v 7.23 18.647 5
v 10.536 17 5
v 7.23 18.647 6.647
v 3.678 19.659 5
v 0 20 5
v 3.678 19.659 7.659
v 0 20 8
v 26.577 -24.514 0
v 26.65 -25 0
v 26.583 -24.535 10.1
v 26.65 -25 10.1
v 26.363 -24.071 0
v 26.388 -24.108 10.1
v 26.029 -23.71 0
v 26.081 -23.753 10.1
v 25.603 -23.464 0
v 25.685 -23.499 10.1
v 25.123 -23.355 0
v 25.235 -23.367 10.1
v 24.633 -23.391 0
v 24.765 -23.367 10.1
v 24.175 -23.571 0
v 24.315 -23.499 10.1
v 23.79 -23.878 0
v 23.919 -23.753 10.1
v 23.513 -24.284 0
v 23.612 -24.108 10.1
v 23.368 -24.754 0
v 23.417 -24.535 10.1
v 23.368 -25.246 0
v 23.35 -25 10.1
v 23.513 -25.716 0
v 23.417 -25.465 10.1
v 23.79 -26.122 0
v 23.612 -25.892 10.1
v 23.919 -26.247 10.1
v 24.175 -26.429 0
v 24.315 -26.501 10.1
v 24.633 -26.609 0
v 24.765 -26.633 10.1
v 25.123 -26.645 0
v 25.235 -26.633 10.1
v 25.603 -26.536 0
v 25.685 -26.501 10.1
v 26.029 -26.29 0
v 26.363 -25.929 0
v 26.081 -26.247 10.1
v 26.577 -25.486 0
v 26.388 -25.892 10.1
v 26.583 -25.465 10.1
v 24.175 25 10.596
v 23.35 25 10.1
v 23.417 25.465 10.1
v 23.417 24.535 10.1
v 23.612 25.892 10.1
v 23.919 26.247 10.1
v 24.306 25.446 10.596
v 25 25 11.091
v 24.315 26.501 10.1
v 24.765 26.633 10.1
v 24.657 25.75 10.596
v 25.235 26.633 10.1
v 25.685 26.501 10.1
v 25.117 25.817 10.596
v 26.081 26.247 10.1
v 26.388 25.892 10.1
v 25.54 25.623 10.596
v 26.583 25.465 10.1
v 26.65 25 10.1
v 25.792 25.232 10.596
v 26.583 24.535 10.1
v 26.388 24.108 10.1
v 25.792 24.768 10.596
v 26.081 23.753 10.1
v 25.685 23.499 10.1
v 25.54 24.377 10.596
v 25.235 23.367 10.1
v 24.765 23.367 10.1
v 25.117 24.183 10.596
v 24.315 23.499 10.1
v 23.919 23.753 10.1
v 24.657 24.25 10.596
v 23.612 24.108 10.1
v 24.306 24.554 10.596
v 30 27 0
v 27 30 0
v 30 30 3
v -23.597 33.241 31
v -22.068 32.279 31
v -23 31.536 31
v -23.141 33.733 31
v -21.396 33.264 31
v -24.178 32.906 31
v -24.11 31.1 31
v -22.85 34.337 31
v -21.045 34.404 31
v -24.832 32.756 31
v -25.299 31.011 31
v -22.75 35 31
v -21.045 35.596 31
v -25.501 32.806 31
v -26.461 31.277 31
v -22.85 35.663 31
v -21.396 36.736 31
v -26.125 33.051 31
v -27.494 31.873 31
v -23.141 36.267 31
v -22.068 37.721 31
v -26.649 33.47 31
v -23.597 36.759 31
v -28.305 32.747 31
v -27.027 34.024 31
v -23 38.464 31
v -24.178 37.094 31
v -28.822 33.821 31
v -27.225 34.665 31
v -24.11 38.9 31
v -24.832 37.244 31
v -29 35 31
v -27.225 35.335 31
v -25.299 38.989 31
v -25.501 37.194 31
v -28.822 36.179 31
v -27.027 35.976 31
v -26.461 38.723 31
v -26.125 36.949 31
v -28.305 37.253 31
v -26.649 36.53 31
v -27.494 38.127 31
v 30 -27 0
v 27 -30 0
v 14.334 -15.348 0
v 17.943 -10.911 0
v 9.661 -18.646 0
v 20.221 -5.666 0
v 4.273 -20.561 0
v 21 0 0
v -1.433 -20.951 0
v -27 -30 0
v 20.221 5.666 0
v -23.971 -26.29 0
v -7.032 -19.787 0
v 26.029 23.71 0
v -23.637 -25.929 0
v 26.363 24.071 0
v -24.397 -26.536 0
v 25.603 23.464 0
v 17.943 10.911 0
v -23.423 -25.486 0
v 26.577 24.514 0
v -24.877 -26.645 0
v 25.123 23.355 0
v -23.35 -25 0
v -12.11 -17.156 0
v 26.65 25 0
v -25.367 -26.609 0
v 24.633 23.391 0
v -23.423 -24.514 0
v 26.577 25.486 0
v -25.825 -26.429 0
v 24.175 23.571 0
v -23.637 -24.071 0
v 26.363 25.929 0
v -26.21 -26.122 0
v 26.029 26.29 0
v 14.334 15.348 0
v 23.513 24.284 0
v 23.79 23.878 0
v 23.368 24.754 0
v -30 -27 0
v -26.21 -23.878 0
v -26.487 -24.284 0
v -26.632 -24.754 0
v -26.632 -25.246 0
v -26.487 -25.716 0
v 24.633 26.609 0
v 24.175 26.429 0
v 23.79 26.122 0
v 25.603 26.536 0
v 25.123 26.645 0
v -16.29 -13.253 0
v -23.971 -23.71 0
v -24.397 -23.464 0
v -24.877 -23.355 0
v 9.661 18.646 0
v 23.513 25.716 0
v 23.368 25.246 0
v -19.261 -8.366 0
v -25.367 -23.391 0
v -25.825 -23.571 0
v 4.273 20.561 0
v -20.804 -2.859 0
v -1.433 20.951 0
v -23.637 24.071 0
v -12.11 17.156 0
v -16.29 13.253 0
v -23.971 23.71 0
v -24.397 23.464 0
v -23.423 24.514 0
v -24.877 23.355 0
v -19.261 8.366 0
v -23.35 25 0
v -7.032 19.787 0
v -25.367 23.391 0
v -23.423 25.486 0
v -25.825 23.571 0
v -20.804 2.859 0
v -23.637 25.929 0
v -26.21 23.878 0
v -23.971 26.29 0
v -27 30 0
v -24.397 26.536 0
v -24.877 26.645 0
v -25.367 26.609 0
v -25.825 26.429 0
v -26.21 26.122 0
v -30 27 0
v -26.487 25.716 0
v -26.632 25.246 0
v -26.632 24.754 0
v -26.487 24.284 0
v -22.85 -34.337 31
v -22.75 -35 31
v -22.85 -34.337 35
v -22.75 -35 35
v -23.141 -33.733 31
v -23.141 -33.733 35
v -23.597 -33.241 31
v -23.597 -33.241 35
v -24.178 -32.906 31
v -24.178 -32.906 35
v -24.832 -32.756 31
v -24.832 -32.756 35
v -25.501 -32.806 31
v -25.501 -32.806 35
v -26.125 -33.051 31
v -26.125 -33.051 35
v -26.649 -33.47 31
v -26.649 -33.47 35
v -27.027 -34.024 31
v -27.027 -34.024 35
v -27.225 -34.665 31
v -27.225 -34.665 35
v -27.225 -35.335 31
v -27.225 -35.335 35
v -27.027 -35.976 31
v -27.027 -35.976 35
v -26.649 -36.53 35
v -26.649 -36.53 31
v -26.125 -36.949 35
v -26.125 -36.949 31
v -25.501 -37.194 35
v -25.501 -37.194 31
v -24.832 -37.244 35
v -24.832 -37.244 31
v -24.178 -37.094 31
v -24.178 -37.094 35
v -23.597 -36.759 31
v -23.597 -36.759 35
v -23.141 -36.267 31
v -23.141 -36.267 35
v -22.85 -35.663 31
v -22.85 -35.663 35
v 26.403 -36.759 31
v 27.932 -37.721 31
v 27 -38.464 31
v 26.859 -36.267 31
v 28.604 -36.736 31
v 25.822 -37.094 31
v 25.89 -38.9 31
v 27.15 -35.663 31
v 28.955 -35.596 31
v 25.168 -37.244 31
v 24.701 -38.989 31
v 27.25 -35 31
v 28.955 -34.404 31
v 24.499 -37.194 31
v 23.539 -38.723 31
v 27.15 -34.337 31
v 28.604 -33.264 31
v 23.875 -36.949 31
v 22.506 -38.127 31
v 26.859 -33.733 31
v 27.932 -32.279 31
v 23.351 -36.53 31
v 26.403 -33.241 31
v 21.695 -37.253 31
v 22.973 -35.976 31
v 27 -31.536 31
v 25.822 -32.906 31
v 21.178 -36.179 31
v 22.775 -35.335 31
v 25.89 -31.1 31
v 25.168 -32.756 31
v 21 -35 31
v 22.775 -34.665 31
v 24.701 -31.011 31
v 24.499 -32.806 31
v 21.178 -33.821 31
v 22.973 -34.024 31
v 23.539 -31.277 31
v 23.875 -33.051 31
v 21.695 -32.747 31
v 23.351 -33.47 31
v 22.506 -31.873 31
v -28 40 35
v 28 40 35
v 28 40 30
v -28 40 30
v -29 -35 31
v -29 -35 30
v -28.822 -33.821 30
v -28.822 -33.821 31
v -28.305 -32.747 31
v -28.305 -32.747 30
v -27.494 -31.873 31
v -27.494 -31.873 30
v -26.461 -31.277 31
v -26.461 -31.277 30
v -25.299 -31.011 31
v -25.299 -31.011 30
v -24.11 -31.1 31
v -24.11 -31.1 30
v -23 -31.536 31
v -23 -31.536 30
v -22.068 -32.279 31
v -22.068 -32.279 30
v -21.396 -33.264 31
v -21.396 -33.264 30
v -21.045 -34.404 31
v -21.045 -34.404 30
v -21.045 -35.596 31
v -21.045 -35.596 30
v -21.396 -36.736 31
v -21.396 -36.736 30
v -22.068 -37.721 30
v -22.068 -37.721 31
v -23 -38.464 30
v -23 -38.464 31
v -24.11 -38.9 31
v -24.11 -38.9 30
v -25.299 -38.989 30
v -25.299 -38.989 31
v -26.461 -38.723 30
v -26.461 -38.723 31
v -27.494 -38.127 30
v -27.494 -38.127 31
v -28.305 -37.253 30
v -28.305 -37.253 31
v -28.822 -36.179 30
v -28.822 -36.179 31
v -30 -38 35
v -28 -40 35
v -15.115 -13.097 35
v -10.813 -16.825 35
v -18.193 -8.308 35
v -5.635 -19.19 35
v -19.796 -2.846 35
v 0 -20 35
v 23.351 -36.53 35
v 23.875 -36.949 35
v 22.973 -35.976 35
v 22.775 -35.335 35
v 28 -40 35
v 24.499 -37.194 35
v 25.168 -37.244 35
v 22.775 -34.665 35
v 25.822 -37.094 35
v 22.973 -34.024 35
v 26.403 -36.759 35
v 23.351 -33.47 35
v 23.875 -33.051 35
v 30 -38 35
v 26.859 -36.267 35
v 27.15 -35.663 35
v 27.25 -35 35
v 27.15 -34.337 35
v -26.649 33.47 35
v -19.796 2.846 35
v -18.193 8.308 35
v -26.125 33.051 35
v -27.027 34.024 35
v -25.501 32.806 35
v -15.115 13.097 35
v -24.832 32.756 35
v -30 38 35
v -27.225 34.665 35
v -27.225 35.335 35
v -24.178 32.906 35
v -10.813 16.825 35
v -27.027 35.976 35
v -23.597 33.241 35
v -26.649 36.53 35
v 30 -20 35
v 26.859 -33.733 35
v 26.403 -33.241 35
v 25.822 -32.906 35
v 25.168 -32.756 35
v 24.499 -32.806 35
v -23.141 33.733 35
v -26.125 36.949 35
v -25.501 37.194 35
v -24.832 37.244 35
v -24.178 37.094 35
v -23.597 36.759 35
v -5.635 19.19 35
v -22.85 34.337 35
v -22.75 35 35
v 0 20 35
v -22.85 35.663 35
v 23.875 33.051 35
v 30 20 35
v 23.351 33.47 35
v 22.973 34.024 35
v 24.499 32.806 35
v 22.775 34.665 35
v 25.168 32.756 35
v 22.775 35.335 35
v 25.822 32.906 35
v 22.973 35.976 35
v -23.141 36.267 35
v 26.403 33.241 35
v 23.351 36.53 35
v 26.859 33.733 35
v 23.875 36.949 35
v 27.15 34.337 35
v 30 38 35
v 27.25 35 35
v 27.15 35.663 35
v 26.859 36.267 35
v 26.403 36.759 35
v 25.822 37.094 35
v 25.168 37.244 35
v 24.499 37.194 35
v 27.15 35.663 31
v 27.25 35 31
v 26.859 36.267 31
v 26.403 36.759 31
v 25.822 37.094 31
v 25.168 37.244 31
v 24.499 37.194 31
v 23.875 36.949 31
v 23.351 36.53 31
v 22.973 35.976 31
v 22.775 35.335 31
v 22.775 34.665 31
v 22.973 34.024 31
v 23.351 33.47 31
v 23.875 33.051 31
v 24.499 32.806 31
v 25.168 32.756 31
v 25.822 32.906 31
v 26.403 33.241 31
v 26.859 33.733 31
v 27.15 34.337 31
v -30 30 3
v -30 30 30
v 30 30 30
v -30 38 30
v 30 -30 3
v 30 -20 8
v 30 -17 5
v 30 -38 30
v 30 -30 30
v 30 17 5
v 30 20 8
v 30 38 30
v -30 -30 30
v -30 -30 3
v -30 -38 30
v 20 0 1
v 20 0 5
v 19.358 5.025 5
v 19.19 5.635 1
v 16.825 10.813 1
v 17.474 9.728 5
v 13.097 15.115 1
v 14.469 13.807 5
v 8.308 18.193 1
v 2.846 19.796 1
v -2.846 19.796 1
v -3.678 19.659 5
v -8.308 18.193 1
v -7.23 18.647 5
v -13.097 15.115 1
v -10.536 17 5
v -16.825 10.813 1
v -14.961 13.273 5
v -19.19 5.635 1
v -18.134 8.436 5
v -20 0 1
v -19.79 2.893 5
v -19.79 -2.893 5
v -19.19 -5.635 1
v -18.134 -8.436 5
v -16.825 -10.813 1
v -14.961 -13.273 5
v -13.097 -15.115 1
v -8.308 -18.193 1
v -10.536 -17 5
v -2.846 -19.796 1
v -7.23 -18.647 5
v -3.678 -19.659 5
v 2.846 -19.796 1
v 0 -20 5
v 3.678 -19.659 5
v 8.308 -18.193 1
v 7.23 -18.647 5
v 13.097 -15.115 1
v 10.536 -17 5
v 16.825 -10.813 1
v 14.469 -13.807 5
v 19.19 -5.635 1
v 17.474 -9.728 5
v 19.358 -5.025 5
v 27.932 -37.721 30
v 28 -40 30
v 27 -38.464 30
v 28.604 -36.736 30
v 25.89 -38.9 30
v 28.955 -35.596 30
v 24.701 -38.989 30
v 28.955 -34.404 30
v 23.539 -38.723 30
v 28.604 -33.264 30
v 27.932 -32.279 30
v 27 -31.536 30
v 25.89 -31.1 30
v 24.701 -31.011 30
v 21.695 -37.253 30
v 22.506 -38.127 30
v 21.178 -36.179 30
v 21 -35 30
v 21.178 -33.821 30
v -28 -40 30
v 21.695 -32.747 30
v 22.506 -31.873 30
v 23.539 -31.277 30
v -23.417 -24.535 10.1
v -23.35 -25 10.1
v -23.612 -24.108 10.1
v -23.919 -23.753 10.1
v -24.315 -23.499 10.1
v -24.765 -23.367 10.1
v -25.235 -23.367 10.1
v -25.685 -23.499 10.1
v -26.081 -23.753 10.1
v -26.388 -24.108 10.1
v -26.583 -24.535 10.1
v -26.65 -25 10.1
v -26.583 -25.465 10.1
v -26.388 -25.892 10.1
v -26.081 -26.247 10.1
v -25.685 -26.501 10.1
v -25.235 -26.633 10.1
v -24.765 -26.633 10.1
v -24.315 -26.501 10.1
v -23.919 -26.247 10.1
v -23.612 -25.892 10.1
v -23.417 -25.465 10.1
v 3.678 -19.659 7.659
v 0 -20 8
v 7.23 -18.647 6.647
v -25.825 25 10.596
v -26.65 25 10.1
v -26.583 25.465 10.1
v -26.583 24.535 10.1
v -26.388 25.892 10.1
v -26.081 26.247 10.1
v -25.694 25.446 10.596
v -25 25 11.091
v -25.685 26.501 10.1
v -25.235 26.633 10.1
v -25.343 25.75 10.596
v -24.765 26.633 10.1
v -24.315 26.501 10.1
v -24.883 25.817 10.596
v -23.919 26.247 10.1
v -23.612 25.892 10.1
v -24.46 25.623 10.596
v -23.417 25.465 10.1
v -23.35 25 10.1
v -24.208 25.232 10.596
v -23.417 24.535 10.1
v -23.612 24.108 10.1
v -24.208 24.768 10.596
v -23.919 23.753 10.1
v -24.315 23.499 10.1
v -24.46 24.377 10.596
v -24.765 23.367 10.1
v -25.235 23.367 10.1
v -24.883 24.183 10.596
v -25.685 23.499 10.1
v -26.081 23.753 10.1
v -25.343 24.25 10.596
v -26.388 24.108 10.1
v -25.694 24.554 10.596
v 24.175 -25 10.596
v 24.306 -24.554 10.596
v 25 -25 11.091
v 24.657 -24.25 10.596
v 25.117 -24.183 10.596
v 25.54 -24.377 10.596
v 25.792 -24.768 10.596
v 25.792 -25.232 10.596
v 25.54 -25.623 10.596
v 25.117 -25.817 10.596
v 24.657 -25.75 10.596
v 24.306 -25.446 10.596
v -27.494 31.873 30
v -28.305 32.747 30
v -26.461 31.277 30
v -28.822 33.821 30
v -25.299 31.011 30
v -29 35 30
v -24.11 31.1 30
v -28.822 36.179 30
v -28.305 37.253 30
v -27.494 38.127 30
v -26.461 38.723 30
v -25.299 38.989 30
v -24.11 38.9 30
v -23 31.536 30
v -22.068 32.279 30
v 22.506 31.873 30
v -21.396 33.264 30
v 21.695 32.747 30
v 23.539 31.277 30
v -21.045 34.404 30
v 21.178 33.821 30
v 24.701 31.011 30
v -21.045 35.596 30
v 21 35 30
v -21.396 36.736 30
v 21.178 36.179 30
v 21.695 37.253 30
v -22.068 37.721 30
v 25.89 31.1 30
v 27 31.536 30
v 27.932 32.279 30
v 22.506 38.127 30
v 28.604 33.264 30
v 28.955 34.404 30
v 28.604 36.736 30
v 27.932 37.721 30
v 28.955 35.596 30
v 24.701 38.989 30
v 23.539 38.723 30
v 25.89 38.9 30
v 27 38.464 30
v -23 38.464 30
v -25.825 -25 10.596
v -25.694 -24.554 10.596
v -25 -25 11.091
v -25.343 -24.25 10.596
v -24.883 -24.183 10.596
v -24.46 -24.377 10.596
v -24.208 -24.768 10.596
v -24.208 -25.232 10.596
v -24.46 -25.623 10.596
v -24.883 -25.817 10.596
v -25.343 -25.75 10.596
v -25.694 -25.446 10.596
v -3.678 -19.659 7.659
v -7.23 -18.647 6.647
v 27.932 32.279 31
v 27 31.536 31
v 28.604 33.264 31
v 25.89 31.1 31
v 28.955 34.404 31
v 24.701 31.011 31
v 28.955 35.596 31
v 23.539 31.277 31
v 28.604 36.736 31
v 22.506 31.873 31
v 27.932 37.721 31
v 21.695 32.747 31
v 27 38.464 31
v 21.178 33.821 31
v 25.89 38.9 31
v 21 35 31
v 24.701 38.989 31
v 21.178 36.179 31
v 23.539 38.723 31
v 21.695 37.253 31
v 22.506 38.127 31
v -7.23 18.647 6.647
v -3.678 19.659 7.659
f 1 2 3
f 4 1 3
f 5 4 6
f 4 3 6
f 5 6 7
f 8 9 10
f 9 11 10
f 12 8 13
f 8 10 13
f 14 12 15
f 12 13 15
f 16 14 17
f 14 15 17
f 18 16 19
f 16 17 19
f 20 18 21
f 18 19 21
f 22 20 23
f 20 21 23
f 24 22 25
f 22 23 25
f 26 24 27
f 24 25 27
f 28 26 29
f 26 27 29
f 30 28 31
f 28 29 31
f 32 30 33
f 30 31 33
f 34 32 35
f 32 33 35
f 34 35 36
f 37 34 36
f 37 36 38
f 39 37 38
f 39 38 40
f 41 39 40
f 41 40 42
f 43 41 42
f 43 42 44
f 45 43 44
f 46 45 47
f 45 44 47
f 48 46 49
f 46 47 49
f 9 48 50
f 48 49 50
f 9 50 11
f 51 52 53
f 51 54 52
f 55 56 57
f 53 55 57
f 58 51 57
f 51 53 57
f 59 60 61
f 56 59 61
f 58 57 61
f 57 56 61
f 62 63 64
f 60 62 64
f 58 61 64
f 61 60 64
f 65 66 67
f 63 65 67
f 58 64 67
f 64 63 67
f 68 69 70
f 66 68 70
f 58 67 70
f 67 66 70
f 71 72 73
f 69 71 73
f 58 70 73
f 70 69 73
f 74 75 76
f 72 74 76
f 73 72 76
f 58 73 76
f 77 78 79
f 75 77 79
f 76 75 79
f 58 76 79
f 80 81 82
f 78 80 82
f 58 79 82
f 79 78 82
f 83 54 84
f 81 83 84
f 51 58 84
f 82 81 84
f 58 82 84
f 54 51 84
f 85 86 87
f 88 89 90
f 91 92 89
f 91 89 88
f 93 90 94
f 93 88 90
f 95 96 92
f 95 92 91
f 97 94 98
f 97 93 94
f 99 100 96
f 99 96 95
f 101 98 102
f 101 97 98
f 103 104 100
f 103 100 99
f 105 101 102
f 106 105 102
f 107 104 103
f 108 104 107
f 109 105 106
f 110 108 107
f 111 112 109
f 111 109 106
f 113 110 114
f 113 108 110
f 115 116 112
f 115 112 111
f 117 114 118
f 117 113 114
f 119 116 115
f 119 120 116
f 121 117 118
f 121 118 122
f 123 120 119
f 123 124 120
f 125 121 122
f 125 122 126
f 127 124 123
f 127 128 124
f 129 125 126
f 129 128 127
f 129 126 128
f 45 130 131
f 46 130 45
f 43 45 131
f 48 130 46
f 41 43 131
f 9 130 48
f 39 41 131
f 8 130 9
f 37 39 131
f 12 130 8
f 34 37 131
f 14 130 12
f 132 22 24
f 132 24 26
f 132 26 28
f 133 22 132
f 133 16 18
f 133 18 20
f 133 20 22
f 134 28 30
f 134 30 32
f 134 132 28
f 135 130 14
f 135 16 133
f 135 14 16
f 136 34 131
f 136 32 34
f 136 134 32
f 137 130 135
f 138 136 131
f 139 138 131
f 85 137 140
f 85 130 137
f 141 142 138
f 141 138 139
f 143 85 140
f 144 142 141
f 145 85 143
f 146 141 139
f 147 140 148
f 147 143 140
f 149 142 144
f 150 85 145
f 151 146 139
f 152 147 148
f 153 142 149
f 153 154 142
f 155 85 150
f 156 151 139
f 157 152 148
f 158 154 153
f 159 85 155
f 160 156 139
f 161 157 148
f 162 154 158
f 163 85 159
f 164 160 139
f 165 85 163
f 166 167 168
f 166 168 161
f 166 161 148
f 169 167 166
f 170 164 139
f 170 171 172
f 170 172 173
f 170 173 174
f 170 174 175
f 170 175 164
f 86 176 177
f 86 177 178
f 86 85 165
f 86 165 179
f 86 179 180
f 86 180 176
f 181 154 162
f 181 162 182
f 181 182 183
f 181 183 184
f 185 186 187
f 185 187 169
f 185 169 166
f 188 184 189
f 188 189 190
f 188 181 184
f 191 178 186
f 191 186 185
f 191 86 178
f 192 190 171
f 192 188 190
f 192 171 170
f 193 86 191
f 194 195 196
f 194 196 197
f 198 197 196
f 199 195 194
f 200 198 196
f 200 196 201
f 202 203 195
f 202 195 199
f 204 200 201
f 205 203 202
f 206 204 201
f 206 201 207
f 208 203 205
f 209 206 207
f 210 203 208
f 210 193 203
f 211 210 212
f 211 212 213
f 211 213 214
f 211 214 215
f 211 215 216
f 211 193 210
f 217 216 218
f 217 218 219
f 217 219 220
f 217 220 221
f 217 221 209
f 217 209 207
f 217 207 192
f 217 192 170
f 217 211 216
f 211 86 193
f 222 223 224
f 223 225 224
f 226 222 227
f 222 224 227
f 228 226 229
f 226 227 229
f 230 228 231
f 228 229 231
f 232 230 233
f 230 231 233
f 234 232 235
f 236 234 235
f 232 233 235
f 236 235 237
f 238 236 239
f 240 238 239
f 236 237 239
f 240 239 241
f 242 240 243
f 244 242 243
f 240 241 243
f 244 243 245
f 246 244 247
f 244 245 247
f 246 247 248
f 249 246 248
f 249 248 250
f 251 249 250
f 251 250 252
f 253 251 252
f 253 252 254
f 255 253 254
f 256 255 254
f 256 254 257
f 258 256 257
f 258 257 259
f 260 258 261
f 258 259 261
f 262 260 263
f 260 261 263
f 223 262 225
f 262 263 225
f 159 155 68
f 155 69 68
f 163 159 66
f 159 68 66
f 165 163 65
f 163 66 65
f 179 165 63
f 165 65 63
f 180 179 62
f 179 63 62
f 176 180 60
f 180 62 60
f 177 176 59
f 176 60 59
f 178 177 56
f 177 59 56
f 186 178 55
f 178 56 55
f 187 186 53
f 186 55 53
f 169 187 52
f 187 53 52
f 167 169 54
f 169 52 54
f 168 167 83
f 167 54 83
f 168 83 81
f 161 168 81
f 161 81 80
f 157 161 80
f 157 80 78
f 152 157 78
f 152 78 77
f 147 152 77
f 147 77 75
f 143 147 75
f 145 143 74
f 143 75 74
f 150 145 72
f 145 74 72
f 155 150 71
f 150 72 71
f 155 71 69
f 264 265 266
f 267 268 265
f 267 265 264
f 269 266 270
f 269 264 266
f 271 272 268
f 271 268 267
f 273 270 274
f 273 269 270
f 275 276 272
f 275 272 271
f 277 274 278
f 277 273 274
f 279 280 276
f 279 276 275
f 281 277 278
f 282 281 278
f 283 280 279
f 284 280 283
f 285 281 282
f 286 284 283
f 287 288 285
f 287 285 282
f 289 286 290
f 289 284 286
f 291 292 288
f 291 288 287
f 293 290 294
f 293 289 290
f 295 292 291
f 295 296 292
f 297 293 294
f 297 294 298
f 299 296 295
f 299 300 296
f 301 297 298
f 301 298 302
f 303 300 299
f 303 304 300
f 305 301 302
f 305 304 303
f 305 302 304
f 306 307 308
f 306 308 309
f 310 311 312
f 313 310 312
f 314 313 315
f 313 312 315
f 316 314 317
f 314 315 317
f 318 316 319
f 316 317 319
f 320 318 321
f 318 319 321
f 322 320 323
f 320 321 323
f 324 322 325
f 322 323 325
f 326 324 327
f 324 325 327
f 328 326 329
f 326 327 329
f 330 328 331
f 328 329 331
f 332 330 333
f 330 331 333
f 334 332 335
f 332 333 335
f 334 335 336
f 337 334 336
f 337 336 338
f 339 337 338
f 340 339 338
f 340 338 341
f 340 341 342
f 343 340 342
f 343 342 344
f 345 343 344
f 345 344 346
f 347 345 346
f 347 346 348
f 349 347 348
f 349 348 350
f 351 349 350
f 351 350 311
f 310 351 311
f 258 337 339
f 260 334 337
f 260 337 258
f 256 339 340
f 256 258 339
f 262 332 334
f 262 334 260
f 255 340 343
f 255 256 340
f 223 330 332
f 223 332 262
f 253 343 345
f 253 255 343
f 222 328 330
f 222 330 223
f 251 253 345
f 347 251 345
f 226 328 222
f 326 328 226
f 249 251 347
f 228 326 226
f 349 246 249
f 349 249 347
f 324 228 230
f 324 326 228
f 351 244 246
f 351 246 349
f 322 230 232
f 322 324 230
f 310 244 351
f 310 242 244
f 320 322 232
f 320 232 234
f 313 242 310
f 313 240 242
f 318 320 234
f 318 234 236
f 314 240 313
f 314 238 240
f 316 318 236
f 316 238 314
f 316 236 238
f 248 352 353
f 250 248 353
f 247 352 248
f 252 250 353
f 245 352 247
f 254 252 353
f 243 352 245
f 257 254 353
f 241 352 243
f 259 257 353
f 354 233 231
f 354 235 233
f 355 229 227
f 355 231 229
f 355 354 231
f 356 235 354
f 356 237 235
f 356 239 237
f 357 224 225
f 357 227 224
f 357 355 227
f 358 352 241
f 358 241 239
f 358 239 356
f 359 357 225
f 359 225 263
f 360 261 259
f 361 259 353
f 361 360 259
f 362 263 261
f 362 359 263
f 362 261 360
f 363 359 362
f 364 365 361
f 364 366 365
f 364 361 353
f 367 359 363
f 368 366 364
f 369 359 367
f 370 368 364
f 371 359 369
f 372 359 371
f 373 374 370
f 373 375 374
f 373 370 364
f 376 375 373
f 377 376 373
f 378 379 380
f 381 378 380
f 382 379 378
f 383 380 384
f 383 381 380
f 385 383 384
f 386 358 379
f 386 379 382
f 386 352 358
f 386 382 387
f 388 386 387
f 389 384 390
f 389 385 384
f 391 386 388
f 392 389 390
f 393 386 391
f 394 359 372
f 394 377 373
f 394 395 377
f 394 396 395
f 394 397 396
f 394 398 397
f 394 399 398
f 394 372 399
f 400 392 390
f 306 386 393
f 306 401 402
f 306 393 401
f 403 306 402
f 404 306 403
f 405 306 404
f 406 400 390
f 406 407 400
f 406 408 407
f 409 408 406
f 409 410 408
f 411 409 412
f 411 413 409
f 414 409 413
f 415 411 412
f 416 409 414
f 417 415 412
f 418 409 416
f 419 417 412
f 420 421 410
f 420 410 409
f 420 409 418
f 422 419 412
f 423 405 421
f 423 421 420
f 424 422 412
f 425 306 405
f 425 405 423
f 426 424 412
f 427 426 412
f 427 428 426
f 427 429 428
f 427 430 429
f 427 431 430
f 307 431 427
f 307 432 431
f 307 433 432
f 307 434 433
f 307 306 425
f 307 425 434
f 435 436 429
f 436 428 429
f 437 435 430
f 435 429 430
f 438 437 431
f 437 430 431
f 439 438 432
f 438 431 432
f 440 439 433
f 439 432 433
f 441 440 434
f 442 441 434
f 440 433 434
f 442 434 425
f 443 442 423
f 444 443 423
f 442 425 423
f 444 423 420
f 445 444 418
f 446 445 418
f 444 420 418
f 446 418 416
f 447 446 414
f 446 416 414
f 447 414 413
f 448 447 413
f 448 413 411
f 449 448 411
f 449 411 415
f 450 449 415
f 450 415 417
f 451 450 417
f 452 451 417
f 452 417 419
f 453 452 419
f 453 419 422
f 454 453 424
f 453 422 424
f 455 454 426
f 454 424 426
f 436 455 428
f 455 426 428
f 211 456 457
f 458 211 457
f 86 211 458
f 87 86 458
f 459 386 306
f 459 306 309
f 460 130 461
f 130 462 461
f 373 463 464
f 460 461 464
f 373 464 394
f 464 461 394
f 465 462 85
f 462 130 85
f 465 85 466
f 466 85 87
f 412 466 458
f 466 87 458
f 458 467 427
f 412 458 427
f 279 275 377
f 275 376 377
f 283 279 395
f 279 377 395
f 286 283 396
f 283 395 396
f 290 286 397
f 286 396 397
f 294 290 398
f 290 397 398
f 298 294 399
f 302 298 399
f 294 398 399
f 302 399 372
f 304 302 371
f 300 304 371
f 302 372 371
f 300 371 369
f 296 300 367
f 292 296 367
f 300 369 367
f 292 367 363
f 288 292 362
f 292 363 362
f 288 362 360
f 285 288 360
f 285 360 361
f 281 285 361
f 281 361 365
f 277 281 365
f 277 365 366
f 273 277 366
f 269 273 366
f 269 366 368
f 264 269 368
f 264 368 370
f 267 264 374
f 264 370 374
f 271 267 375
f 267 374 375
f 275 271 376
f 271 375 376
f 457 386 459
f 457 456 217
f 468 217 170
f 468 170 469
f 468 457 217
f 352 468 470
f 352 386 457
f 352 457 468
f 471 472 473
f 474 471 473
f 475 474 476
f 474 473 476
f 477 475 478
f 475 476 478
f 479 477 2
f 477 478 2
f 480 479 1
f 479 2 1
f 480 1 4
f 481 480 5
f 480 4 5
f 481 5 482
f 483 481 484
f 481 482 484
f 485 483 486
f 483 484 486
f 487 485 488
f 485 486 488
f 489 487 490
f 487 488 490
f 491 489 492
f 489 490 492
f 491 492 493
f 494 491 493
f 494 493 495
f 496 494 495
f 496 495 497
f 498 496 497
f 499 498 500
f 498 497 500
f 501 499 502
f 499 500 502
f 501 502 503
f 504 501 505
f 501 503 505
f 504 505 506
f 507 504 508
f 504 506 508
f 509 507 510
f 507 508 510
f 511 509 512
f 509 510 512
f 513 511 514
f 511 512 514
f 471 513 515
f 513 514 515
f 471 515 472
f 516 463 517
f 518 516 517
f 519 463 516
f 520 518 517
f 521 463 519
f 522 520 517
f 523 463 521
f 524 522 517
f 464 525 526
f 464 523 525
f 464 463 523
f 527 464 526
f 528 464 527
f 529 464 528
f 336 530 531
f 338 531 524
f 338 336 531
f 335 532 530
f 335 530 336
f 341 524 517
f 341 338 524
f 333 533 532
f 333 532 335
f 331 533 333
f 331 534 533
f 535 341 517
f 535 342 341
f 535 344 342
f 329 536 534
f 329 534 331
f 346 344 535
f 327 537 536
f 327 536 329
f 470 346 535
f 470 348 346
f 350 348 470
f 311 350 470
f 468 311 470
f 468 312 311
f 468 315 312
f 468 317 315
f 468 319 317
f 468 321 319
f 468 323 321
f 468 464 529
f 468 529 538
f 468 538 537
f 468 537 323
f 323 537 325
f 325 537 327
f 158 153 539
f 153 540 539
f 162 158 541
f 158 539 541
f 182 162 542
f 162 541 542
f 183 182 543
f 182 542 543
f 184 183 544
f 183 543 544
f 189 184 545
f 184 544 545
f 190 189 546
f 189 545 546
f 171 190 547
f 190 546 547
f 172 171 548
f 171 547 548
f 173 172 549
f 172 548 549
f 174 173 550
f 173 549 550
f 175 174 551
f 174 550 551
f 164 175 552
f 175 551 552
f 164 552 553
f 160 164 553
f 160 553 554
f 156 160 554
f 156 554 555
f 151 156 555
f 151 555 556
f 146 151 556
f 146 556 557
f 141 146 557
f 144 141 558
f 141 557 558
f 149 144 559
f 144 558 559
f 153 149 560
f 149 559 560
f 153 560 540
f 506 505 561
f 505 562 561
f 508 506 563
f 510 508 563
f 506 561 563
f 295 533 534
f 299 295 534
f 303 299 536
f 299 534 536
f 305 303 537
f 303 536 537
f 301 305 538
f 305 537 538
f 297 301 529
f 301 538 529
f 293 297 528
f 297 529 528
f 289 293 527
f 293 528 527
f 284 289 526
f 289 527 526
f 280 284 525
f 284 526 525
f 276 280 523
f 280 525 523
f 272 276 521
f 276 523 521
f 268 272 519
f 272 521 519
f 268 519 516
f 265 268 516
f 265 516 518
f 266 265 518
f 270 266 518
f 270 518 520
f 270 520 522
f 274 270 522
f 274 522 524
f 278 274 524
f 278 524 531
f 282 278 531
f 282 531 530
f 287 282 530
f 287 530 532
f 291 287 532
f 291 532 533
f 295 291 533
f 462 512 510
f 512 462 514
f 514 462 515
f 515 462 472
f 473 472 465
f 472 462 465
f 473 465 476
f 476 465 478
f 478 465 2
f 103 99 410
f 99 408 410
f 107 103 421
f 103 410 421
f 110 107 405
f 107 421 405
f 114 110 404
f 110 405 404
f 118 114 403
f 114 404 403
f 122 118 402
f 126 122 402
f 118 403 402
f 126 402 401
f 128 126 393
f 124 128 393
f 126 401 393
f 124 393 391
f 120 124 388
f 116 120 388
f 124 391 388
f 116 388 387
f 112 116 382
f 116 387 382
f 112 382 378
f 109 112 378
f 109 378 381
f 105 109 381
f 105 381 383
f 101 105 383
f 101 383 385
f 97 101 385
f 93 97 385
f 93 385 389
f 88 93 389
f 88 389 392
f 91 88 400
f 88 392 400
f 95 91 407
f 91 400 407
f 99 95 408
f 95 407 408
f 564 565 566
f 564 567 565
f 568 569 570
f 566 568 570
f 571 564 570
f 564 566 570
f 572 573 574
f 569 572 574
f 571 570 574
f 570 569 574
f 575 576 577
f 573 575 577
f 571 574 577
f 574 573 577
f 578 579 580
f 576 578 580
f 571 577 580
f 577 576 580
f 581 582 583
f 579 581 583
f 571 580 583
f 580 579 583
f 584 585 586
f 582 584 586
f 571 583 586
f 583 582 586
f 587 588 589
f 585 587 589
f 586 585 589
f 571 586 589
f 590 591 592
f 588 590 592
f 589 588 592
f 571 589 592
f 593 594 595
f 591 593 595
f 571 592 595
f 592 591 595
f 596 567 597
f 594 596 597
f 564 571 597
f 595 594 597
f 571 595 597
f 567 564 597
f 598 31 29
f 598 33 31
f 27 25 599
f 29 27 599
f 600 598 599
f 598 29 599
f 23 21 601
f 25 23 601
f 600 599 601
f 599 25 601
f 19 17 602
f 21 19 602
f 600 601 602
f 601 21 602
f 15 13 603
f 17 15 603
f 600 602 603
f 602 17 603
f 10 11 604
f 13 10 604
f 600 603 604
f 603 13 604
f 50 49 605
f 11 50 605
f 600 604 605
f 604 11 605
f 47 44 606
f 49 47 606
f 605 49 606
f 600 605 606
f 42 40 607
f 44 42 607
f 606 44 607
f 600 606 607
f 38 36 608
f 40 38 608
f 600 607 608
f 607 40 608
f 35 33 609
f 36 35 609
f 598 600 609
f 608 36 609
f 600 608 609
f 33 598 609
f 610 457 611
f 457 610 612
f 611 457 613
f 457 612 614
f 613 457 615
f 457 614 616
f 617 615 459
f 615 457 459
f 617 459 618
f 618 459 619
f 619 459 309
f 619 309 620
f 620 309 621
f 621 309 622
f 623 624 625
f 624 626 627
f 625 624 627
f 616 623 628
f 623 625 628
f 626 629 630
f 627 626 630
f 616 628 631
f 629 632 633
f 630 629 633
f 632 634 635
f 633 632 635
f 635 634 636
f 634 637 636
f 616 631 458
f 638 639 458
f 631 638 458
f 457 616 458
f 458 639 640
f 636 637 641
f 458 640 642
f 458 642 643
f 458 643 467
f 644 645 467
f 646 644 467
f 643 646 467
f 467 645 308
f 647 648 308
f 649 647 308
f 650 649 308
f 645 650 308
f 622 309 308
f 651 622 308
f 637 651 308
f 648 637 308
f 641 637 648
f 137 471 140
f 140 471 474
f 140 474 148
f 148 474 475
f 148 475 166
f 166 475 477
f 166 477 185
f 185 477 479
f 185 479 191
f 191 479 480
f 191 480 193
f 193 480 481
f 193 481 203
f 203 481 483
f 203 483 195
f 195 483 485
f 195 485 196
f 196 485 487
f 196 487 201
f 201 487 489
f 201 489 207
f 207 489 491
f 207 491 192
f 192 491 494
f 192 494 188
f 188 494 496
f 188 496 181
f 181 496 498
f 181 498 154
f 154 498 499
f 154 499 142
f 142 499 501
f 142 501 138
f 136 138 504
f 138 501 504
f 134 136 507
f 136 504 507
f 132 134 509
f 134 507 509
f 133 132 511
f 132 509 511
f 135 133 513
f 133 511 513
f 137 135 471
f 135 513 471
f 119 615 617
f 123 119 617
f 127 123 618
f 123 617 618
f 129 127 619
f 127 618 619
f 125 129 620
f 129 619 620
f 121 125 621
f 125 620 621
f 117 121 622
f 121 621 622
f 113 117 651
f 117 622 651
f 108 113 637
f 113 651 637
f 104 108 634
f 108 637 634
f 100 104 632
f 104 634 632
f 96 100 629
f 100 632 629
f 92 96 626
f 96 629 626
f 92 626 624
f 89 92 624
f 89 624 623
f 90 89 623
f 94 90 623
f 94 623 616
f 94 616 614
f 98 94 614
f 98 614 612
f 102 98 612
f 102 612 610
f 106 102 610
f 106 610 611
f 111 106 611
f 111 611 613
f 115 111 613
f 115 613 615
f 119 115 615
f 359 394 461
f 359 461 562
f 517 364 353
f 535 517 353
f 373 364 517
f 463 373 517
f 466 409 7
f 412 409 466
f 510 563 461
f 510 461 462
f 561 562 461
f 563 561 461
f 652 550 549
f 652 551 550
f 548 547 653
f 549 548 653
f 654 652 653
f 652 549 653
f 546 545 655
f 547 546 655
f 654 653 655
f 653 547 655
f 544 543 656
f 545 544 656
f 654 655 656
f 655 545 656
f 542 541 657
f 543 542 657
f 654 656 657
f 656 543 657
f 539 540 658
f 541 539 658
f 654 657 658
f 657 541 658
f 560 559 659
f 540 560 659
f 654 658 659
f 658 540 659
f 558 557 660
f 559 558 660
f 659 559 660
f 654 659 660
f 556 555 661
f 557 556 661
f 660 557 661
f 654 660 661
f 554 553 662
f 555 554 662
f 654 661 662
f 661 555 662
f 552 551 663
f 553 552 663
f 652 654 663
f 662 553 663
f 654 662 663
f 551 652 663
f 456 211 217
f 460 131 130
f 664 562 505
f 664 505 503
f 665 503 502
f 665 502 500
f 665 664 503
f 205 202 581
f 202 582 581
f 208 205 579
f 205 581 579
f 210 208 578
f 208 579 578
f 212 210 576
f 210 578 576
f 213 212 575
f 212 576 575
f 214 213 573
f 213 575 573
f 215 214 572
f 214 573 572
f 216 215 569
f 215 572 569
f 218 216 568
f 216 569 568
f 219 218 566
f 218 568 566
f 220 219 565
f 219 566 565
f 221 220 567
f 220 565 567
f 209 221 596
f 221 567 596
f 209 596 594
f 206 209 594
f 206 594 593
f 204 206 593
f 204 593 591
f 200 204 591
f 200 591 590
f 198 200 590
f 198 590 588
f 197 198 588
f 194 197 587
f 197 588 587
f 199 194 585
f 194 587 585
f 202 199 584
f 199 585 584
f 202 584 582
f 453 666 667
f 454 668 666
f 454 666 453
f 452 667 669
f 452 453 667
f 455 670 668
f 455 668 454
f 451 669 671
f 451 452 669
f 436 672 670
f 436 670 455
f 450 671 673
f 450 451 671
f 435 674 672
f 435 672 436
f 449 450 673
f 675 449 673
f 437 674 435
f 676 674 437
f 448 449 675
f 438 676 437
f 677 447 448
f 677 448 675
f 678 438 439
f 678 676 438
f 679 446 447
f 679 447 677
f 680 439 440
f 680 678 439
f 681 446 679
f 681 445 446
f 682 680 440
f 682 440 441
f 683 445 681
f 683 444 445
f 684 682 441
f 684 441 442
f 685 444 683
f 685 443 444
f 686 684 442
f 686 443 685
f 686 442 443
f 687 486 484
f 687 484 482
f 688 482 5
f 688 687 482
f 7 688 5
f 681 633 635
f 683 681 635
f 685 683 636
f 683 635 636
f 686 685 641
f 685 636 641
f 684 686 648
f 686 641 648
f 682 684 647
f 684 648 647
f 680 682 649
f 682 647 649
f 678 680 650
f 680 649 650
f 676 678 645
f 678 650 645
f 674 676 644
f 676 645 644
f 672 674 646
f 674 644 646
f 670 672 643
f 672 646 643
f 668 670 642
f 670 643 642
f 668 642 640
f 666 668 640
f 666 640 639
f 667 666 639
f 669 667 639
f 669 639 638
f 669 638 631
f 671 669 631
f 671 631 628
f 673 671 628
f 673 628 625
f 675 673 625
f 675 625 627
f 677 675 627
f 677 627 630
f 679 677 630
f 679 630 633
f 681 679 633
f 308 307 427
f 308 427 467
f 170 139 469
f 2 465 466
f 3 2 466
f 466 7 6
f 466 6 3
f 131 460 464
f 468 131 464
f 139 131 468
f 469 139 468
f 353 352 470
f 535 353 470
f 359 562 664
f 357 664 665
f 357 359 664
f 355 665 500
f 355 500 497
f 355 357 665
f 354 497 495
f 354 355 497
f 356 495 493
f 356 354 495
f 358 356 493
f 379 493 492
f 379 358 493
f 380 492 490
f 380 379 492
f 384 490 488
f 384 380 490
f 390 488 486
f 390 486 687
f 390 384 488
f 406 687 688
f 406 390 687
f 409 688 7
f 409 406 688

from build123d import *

# Parameters (mm, degrees)
BOSS_EXTRUDE1_DEPTH                                  = 35
CUT_EXTRUDE1_DEPTH                                   = 30
SKETCH3_R                                            = 20.000000000000007
CUT_EXTRUDE2_DEPTH                                   = 52.96152422706633
M4_TAPPED_HOLE1_D                                    = 3.3
M4_TAPPED_HOLE1_DEPTH                                = 10.1
M4_TAPPED_HOLE1_TIP                                  = 0.9914200213954745
BOSS_EXTRUDE2_DEPTH                                  = 5
CBORE_FOR_M4_HEXAGON_SOCKET_HEAD_CAP_SCR_D           = 4.5
CBORE_FOR_M4_HEXAGON_SOCKET_HEAD_CAP_SCR_CBORE_D     = 8
CBORE_FOR_M4_HEXAGON_SOCKET_HEAD_CAP_SCR_CBORE_DEPTH = 1
CHAMFER1_SIZE                                        = 2
CHAMFER2_START                                       = 32.908965344
CHAMFER2_OUTLINE_W                                   = 7.000000000000002
CHAMFER2_OUTLINE_H                                   = 7.0000000000000036
CHAMFER2_DEPTH                                       = 3.091034656
MIRROR1_START                                        = 32.908965344
MIRROR1_AT_THE_SECOND_PLANE_COPY_1_SKETC_W           = 7.000000000000002
MIRROR1_AT_THE_SECOND_PLANE_COPY_1_SKETC_H           = 7.0000000000000036
MIRROR1_AT_THE_SECOND_PLANE_COPY_1_DEPTH             = 3.091034656
CHAMFER3_SIZE                                        = 1
CHAMFER4_SIZE                                        = 3


with BuildPart() as part:
    # Sketch1 → Boss-Extrude1 (new body)
    with BuildSketch(Plane.XY):
        Polygon((-29.999999999999993, 30), (30, 30), (30.000000000000014, -30), (-29.999999999999986, -30), align=None)
    extrude(amount=BOSS_EXTRUDE1_DEPTH)

    # Sketch2 → Cut-Extrude1 (cut)
    with BuildSketch(Plane.XY.offset(35)):
        with BuildLine():
            Line((0, 20.000000000000004), (30.00000000000001, 20.000000000000004))
            Line((30.00000000000001, 20.000000000000004), (30, -20.000000000000004))
            Line((30, -20.000000000000004), (0, -20.000000000000004))
            ThreePointArc((0, -20.000000000000004), (-20.000000000000004, 2.45e-15), (0, 20.000000000000004))
        make_face()
    extrude(amount=-CUT_EXTRUDE1_DEPTH, mode=Mode.SUBTRACT)

    # Sketch3 → Cut-Extrude2 (cut, through all)
    with BuildSketch(Plane.XY.offset(5.000000000000004)):
        Circle(SKETCH3_R)
    extrude(amount=-CUT_EXTRUDE2_DEPTH, mode=Mode.SUBTRACT)

    # M4 Tapped Hole1
    with Locations(Plane(origin=(0, 0, 0), x_dir=(-1, 0, 0), z_dir=(0, 0, -1))):
        with Locations((-25, 25), (25, 25), (25, -25), (-25, -25)):
            Hole(M4_TAPPED_HOLE1_D / 2, depth=M4_TAPPED_HOLE1_DEPTH)
            with Locations((0, 0, -(M4_TAPPED_HOLE1_DEPTH + M4_TAPPED_HOLE1_TIP / 2))):  # 118° drill point
                Cone(0, M4_TAPPED_HOLE1_D / 2, M4_TAPPED_HOLE1_TIP, mode=Mode.SUBTRACT)

    # Sketch7 → Boss-Extrude2 (add)
    with BuildSketch(Plane.XY.offset(35)):
        Polygon((-29.999999999999993, 30), (30, 29.999999999999993), (30, 40), (-29.999999999999993, 40), align=None)
        Polygon((30, -29.999999999999993), (30, -40), (-29.999999999999993, -40), (-29.999999999999993, -30), align=None)
    extrude(amount=-BOSS_EXTRUDE2_DEPTH)

    # CBORE for M4 Hexagon socket head cap screws1 (through all)
    with Locations(Plane(origin=(0, 0, 30.000000000000004), x_dir=(-1, 0, 0), z_dir=(0, 0, -1))):
        with Locations((-25, 35), (-25, -35), (25, -35), (25, 35)):
            CounterBoreHole(CBORE_FOR_M4_HEXAGON_SOCKET_HEAD_CAP_SCR_D / 2, CBORE_FOR_M4_HEXAGON_SOCKET_HEAD_CAP_SCR_CBORE_D / 2, CBORE_FOR_M4_HEXAGON_SOCKET_HEAD_CAP_SCR_CBORE_DEPTH)

    # Chamfer1
    chamfer1_edges = [part.edges().sort_by_distance(p)[0] for p in [
        (-29.999999999999993, 40, 32.5),
        (30, 40, 32.5),
        (30, -40, 32.5),
        (-29.999999999999993, -40, 32.5),
    ]]
    chamfer(chamfer1_edges, length=CHAMFER1_SIZE)

    # Chamfer2: read off the stored shape, not the designer's step
    # Chamfer2 outline → Chamfer2 (cut)
    with BuildSketch(Plane(origin=(0, 0, 0), x_dir=(0.8164965809277258, -0.40824829046386313, 0.40824829046386313), z_dir=(0.5773502691896258, 0.5773502691896258, -0.5773502691896258)).offset(CHAMFER2_START)):
        with Locations((11.5, -21.5)):
            Rectangle(CHAMFER2_OUTLINE_W, CHAMFER2_OUTLINE_H)
    chamfer2 = extrude(amount=CHAMFER2_DEPTH, mode=Mode.SUBTRACT)

    # Mirror1: Chamfer2 across plane
    add(chamfer2.mirror(Plane(origin=(0, 0, 0), x_dir=(0, 0, 1), z_dir=(1, 0, 0))), mode=Mode.SUBTRACT)

    # Mirror1 at the second plane: Chamfer2 across plane
    add(chamfer2.mirror(Plane.ZX), mode=Mode.SUBTRACT)

    # Mirror1 at the second plane copy 1 sketc → Mirror1 at the second plane copy 1 (cut)
    with BuildSketch(Plane(origin=(0, 0, 0), x_dir=(-0.8164965809277258, 0.40824829046386313, 0.40824829046386313), z_dir=(-0.5773502691896258, -0.5773502691896258, -0.5773502691896258)).offset(MIRROR1_START)):
        with Locations((11.5, -21.5)):
            Rectangle(MIRROR1_AT_THE_SECOND_PLANE_COPY_1_SKETC_W, MIRROR1_AT_THE_SECOND_PLANE_COPY_1_SKETC_H)
    extrude(amount=MIRROR1_AT_THE_SECOND_PLANE_COPY_1_DEPTH, mode=Mode.SUBTRACT)

    # Chamfer3
    chamfer3_edges = [part.edges().sort_by_distance(p)[0] for p in [
        (-20.000000000000007, 2.45e-15, 0),
    ]]
    chamfer(chamfer3_edges, length=CHAMFER3_SIZE)

    # Chamfer4
    # the kernel refuses this chamfer: 3 mm, written as the material it adds along each edge
    with BuildSketch(Plane(origin=(-13.115583238626146, 20.000000000000004, 5), x_dir=(0, -1, 0), z_dir=(1, 0, 0))) as chamfer4_piece_1_section:
        Polygon((CHAMFER4_SIZE, 0), (0, -CHAMFER4_SIZE), (0, 0), align=None)
    chamfer4_piece_1 = extrude(amount=43.11558323862616, mode=Mode.PRIVATE)
    chamfer4_piece_1 = chamfer4_piece_1 - Plane(origin=(0, 0, 5), x_dir=(1, 0, 0), z_dir=(0, 0, 1)) * Cylinder(20.000000000000007, 99, mode=Mode.PRIVATE)
    add(chamfer4_piece_1)
    with BuildSketch(Plane(origin=(30, -20.000000000000004, 5), x_dir=(0, 0, 1), z_dir=(-1, 0, 0))) as chamfer4_piece_2_section:
        Polygon((CHAMFER4_SIZE, 0), (0, CHAMFER4_SIZE), (0, 0), align=None)
    chamfer4_piece_2 = extrude(amount=43.11558323862615, mode=Mode.PRIVATE)
    chamfer4_piece_2 = chamfer4_piece_2 - Plane(origin=(0, 0, 5), x_dir=(1, 0, 0), z_dir=(0, 0, 1)) * Cylinder(20.000000000000007, 99, mode=Mode.PRIVATE)
    add(chamfer4_piece_2)


solid = part.part
